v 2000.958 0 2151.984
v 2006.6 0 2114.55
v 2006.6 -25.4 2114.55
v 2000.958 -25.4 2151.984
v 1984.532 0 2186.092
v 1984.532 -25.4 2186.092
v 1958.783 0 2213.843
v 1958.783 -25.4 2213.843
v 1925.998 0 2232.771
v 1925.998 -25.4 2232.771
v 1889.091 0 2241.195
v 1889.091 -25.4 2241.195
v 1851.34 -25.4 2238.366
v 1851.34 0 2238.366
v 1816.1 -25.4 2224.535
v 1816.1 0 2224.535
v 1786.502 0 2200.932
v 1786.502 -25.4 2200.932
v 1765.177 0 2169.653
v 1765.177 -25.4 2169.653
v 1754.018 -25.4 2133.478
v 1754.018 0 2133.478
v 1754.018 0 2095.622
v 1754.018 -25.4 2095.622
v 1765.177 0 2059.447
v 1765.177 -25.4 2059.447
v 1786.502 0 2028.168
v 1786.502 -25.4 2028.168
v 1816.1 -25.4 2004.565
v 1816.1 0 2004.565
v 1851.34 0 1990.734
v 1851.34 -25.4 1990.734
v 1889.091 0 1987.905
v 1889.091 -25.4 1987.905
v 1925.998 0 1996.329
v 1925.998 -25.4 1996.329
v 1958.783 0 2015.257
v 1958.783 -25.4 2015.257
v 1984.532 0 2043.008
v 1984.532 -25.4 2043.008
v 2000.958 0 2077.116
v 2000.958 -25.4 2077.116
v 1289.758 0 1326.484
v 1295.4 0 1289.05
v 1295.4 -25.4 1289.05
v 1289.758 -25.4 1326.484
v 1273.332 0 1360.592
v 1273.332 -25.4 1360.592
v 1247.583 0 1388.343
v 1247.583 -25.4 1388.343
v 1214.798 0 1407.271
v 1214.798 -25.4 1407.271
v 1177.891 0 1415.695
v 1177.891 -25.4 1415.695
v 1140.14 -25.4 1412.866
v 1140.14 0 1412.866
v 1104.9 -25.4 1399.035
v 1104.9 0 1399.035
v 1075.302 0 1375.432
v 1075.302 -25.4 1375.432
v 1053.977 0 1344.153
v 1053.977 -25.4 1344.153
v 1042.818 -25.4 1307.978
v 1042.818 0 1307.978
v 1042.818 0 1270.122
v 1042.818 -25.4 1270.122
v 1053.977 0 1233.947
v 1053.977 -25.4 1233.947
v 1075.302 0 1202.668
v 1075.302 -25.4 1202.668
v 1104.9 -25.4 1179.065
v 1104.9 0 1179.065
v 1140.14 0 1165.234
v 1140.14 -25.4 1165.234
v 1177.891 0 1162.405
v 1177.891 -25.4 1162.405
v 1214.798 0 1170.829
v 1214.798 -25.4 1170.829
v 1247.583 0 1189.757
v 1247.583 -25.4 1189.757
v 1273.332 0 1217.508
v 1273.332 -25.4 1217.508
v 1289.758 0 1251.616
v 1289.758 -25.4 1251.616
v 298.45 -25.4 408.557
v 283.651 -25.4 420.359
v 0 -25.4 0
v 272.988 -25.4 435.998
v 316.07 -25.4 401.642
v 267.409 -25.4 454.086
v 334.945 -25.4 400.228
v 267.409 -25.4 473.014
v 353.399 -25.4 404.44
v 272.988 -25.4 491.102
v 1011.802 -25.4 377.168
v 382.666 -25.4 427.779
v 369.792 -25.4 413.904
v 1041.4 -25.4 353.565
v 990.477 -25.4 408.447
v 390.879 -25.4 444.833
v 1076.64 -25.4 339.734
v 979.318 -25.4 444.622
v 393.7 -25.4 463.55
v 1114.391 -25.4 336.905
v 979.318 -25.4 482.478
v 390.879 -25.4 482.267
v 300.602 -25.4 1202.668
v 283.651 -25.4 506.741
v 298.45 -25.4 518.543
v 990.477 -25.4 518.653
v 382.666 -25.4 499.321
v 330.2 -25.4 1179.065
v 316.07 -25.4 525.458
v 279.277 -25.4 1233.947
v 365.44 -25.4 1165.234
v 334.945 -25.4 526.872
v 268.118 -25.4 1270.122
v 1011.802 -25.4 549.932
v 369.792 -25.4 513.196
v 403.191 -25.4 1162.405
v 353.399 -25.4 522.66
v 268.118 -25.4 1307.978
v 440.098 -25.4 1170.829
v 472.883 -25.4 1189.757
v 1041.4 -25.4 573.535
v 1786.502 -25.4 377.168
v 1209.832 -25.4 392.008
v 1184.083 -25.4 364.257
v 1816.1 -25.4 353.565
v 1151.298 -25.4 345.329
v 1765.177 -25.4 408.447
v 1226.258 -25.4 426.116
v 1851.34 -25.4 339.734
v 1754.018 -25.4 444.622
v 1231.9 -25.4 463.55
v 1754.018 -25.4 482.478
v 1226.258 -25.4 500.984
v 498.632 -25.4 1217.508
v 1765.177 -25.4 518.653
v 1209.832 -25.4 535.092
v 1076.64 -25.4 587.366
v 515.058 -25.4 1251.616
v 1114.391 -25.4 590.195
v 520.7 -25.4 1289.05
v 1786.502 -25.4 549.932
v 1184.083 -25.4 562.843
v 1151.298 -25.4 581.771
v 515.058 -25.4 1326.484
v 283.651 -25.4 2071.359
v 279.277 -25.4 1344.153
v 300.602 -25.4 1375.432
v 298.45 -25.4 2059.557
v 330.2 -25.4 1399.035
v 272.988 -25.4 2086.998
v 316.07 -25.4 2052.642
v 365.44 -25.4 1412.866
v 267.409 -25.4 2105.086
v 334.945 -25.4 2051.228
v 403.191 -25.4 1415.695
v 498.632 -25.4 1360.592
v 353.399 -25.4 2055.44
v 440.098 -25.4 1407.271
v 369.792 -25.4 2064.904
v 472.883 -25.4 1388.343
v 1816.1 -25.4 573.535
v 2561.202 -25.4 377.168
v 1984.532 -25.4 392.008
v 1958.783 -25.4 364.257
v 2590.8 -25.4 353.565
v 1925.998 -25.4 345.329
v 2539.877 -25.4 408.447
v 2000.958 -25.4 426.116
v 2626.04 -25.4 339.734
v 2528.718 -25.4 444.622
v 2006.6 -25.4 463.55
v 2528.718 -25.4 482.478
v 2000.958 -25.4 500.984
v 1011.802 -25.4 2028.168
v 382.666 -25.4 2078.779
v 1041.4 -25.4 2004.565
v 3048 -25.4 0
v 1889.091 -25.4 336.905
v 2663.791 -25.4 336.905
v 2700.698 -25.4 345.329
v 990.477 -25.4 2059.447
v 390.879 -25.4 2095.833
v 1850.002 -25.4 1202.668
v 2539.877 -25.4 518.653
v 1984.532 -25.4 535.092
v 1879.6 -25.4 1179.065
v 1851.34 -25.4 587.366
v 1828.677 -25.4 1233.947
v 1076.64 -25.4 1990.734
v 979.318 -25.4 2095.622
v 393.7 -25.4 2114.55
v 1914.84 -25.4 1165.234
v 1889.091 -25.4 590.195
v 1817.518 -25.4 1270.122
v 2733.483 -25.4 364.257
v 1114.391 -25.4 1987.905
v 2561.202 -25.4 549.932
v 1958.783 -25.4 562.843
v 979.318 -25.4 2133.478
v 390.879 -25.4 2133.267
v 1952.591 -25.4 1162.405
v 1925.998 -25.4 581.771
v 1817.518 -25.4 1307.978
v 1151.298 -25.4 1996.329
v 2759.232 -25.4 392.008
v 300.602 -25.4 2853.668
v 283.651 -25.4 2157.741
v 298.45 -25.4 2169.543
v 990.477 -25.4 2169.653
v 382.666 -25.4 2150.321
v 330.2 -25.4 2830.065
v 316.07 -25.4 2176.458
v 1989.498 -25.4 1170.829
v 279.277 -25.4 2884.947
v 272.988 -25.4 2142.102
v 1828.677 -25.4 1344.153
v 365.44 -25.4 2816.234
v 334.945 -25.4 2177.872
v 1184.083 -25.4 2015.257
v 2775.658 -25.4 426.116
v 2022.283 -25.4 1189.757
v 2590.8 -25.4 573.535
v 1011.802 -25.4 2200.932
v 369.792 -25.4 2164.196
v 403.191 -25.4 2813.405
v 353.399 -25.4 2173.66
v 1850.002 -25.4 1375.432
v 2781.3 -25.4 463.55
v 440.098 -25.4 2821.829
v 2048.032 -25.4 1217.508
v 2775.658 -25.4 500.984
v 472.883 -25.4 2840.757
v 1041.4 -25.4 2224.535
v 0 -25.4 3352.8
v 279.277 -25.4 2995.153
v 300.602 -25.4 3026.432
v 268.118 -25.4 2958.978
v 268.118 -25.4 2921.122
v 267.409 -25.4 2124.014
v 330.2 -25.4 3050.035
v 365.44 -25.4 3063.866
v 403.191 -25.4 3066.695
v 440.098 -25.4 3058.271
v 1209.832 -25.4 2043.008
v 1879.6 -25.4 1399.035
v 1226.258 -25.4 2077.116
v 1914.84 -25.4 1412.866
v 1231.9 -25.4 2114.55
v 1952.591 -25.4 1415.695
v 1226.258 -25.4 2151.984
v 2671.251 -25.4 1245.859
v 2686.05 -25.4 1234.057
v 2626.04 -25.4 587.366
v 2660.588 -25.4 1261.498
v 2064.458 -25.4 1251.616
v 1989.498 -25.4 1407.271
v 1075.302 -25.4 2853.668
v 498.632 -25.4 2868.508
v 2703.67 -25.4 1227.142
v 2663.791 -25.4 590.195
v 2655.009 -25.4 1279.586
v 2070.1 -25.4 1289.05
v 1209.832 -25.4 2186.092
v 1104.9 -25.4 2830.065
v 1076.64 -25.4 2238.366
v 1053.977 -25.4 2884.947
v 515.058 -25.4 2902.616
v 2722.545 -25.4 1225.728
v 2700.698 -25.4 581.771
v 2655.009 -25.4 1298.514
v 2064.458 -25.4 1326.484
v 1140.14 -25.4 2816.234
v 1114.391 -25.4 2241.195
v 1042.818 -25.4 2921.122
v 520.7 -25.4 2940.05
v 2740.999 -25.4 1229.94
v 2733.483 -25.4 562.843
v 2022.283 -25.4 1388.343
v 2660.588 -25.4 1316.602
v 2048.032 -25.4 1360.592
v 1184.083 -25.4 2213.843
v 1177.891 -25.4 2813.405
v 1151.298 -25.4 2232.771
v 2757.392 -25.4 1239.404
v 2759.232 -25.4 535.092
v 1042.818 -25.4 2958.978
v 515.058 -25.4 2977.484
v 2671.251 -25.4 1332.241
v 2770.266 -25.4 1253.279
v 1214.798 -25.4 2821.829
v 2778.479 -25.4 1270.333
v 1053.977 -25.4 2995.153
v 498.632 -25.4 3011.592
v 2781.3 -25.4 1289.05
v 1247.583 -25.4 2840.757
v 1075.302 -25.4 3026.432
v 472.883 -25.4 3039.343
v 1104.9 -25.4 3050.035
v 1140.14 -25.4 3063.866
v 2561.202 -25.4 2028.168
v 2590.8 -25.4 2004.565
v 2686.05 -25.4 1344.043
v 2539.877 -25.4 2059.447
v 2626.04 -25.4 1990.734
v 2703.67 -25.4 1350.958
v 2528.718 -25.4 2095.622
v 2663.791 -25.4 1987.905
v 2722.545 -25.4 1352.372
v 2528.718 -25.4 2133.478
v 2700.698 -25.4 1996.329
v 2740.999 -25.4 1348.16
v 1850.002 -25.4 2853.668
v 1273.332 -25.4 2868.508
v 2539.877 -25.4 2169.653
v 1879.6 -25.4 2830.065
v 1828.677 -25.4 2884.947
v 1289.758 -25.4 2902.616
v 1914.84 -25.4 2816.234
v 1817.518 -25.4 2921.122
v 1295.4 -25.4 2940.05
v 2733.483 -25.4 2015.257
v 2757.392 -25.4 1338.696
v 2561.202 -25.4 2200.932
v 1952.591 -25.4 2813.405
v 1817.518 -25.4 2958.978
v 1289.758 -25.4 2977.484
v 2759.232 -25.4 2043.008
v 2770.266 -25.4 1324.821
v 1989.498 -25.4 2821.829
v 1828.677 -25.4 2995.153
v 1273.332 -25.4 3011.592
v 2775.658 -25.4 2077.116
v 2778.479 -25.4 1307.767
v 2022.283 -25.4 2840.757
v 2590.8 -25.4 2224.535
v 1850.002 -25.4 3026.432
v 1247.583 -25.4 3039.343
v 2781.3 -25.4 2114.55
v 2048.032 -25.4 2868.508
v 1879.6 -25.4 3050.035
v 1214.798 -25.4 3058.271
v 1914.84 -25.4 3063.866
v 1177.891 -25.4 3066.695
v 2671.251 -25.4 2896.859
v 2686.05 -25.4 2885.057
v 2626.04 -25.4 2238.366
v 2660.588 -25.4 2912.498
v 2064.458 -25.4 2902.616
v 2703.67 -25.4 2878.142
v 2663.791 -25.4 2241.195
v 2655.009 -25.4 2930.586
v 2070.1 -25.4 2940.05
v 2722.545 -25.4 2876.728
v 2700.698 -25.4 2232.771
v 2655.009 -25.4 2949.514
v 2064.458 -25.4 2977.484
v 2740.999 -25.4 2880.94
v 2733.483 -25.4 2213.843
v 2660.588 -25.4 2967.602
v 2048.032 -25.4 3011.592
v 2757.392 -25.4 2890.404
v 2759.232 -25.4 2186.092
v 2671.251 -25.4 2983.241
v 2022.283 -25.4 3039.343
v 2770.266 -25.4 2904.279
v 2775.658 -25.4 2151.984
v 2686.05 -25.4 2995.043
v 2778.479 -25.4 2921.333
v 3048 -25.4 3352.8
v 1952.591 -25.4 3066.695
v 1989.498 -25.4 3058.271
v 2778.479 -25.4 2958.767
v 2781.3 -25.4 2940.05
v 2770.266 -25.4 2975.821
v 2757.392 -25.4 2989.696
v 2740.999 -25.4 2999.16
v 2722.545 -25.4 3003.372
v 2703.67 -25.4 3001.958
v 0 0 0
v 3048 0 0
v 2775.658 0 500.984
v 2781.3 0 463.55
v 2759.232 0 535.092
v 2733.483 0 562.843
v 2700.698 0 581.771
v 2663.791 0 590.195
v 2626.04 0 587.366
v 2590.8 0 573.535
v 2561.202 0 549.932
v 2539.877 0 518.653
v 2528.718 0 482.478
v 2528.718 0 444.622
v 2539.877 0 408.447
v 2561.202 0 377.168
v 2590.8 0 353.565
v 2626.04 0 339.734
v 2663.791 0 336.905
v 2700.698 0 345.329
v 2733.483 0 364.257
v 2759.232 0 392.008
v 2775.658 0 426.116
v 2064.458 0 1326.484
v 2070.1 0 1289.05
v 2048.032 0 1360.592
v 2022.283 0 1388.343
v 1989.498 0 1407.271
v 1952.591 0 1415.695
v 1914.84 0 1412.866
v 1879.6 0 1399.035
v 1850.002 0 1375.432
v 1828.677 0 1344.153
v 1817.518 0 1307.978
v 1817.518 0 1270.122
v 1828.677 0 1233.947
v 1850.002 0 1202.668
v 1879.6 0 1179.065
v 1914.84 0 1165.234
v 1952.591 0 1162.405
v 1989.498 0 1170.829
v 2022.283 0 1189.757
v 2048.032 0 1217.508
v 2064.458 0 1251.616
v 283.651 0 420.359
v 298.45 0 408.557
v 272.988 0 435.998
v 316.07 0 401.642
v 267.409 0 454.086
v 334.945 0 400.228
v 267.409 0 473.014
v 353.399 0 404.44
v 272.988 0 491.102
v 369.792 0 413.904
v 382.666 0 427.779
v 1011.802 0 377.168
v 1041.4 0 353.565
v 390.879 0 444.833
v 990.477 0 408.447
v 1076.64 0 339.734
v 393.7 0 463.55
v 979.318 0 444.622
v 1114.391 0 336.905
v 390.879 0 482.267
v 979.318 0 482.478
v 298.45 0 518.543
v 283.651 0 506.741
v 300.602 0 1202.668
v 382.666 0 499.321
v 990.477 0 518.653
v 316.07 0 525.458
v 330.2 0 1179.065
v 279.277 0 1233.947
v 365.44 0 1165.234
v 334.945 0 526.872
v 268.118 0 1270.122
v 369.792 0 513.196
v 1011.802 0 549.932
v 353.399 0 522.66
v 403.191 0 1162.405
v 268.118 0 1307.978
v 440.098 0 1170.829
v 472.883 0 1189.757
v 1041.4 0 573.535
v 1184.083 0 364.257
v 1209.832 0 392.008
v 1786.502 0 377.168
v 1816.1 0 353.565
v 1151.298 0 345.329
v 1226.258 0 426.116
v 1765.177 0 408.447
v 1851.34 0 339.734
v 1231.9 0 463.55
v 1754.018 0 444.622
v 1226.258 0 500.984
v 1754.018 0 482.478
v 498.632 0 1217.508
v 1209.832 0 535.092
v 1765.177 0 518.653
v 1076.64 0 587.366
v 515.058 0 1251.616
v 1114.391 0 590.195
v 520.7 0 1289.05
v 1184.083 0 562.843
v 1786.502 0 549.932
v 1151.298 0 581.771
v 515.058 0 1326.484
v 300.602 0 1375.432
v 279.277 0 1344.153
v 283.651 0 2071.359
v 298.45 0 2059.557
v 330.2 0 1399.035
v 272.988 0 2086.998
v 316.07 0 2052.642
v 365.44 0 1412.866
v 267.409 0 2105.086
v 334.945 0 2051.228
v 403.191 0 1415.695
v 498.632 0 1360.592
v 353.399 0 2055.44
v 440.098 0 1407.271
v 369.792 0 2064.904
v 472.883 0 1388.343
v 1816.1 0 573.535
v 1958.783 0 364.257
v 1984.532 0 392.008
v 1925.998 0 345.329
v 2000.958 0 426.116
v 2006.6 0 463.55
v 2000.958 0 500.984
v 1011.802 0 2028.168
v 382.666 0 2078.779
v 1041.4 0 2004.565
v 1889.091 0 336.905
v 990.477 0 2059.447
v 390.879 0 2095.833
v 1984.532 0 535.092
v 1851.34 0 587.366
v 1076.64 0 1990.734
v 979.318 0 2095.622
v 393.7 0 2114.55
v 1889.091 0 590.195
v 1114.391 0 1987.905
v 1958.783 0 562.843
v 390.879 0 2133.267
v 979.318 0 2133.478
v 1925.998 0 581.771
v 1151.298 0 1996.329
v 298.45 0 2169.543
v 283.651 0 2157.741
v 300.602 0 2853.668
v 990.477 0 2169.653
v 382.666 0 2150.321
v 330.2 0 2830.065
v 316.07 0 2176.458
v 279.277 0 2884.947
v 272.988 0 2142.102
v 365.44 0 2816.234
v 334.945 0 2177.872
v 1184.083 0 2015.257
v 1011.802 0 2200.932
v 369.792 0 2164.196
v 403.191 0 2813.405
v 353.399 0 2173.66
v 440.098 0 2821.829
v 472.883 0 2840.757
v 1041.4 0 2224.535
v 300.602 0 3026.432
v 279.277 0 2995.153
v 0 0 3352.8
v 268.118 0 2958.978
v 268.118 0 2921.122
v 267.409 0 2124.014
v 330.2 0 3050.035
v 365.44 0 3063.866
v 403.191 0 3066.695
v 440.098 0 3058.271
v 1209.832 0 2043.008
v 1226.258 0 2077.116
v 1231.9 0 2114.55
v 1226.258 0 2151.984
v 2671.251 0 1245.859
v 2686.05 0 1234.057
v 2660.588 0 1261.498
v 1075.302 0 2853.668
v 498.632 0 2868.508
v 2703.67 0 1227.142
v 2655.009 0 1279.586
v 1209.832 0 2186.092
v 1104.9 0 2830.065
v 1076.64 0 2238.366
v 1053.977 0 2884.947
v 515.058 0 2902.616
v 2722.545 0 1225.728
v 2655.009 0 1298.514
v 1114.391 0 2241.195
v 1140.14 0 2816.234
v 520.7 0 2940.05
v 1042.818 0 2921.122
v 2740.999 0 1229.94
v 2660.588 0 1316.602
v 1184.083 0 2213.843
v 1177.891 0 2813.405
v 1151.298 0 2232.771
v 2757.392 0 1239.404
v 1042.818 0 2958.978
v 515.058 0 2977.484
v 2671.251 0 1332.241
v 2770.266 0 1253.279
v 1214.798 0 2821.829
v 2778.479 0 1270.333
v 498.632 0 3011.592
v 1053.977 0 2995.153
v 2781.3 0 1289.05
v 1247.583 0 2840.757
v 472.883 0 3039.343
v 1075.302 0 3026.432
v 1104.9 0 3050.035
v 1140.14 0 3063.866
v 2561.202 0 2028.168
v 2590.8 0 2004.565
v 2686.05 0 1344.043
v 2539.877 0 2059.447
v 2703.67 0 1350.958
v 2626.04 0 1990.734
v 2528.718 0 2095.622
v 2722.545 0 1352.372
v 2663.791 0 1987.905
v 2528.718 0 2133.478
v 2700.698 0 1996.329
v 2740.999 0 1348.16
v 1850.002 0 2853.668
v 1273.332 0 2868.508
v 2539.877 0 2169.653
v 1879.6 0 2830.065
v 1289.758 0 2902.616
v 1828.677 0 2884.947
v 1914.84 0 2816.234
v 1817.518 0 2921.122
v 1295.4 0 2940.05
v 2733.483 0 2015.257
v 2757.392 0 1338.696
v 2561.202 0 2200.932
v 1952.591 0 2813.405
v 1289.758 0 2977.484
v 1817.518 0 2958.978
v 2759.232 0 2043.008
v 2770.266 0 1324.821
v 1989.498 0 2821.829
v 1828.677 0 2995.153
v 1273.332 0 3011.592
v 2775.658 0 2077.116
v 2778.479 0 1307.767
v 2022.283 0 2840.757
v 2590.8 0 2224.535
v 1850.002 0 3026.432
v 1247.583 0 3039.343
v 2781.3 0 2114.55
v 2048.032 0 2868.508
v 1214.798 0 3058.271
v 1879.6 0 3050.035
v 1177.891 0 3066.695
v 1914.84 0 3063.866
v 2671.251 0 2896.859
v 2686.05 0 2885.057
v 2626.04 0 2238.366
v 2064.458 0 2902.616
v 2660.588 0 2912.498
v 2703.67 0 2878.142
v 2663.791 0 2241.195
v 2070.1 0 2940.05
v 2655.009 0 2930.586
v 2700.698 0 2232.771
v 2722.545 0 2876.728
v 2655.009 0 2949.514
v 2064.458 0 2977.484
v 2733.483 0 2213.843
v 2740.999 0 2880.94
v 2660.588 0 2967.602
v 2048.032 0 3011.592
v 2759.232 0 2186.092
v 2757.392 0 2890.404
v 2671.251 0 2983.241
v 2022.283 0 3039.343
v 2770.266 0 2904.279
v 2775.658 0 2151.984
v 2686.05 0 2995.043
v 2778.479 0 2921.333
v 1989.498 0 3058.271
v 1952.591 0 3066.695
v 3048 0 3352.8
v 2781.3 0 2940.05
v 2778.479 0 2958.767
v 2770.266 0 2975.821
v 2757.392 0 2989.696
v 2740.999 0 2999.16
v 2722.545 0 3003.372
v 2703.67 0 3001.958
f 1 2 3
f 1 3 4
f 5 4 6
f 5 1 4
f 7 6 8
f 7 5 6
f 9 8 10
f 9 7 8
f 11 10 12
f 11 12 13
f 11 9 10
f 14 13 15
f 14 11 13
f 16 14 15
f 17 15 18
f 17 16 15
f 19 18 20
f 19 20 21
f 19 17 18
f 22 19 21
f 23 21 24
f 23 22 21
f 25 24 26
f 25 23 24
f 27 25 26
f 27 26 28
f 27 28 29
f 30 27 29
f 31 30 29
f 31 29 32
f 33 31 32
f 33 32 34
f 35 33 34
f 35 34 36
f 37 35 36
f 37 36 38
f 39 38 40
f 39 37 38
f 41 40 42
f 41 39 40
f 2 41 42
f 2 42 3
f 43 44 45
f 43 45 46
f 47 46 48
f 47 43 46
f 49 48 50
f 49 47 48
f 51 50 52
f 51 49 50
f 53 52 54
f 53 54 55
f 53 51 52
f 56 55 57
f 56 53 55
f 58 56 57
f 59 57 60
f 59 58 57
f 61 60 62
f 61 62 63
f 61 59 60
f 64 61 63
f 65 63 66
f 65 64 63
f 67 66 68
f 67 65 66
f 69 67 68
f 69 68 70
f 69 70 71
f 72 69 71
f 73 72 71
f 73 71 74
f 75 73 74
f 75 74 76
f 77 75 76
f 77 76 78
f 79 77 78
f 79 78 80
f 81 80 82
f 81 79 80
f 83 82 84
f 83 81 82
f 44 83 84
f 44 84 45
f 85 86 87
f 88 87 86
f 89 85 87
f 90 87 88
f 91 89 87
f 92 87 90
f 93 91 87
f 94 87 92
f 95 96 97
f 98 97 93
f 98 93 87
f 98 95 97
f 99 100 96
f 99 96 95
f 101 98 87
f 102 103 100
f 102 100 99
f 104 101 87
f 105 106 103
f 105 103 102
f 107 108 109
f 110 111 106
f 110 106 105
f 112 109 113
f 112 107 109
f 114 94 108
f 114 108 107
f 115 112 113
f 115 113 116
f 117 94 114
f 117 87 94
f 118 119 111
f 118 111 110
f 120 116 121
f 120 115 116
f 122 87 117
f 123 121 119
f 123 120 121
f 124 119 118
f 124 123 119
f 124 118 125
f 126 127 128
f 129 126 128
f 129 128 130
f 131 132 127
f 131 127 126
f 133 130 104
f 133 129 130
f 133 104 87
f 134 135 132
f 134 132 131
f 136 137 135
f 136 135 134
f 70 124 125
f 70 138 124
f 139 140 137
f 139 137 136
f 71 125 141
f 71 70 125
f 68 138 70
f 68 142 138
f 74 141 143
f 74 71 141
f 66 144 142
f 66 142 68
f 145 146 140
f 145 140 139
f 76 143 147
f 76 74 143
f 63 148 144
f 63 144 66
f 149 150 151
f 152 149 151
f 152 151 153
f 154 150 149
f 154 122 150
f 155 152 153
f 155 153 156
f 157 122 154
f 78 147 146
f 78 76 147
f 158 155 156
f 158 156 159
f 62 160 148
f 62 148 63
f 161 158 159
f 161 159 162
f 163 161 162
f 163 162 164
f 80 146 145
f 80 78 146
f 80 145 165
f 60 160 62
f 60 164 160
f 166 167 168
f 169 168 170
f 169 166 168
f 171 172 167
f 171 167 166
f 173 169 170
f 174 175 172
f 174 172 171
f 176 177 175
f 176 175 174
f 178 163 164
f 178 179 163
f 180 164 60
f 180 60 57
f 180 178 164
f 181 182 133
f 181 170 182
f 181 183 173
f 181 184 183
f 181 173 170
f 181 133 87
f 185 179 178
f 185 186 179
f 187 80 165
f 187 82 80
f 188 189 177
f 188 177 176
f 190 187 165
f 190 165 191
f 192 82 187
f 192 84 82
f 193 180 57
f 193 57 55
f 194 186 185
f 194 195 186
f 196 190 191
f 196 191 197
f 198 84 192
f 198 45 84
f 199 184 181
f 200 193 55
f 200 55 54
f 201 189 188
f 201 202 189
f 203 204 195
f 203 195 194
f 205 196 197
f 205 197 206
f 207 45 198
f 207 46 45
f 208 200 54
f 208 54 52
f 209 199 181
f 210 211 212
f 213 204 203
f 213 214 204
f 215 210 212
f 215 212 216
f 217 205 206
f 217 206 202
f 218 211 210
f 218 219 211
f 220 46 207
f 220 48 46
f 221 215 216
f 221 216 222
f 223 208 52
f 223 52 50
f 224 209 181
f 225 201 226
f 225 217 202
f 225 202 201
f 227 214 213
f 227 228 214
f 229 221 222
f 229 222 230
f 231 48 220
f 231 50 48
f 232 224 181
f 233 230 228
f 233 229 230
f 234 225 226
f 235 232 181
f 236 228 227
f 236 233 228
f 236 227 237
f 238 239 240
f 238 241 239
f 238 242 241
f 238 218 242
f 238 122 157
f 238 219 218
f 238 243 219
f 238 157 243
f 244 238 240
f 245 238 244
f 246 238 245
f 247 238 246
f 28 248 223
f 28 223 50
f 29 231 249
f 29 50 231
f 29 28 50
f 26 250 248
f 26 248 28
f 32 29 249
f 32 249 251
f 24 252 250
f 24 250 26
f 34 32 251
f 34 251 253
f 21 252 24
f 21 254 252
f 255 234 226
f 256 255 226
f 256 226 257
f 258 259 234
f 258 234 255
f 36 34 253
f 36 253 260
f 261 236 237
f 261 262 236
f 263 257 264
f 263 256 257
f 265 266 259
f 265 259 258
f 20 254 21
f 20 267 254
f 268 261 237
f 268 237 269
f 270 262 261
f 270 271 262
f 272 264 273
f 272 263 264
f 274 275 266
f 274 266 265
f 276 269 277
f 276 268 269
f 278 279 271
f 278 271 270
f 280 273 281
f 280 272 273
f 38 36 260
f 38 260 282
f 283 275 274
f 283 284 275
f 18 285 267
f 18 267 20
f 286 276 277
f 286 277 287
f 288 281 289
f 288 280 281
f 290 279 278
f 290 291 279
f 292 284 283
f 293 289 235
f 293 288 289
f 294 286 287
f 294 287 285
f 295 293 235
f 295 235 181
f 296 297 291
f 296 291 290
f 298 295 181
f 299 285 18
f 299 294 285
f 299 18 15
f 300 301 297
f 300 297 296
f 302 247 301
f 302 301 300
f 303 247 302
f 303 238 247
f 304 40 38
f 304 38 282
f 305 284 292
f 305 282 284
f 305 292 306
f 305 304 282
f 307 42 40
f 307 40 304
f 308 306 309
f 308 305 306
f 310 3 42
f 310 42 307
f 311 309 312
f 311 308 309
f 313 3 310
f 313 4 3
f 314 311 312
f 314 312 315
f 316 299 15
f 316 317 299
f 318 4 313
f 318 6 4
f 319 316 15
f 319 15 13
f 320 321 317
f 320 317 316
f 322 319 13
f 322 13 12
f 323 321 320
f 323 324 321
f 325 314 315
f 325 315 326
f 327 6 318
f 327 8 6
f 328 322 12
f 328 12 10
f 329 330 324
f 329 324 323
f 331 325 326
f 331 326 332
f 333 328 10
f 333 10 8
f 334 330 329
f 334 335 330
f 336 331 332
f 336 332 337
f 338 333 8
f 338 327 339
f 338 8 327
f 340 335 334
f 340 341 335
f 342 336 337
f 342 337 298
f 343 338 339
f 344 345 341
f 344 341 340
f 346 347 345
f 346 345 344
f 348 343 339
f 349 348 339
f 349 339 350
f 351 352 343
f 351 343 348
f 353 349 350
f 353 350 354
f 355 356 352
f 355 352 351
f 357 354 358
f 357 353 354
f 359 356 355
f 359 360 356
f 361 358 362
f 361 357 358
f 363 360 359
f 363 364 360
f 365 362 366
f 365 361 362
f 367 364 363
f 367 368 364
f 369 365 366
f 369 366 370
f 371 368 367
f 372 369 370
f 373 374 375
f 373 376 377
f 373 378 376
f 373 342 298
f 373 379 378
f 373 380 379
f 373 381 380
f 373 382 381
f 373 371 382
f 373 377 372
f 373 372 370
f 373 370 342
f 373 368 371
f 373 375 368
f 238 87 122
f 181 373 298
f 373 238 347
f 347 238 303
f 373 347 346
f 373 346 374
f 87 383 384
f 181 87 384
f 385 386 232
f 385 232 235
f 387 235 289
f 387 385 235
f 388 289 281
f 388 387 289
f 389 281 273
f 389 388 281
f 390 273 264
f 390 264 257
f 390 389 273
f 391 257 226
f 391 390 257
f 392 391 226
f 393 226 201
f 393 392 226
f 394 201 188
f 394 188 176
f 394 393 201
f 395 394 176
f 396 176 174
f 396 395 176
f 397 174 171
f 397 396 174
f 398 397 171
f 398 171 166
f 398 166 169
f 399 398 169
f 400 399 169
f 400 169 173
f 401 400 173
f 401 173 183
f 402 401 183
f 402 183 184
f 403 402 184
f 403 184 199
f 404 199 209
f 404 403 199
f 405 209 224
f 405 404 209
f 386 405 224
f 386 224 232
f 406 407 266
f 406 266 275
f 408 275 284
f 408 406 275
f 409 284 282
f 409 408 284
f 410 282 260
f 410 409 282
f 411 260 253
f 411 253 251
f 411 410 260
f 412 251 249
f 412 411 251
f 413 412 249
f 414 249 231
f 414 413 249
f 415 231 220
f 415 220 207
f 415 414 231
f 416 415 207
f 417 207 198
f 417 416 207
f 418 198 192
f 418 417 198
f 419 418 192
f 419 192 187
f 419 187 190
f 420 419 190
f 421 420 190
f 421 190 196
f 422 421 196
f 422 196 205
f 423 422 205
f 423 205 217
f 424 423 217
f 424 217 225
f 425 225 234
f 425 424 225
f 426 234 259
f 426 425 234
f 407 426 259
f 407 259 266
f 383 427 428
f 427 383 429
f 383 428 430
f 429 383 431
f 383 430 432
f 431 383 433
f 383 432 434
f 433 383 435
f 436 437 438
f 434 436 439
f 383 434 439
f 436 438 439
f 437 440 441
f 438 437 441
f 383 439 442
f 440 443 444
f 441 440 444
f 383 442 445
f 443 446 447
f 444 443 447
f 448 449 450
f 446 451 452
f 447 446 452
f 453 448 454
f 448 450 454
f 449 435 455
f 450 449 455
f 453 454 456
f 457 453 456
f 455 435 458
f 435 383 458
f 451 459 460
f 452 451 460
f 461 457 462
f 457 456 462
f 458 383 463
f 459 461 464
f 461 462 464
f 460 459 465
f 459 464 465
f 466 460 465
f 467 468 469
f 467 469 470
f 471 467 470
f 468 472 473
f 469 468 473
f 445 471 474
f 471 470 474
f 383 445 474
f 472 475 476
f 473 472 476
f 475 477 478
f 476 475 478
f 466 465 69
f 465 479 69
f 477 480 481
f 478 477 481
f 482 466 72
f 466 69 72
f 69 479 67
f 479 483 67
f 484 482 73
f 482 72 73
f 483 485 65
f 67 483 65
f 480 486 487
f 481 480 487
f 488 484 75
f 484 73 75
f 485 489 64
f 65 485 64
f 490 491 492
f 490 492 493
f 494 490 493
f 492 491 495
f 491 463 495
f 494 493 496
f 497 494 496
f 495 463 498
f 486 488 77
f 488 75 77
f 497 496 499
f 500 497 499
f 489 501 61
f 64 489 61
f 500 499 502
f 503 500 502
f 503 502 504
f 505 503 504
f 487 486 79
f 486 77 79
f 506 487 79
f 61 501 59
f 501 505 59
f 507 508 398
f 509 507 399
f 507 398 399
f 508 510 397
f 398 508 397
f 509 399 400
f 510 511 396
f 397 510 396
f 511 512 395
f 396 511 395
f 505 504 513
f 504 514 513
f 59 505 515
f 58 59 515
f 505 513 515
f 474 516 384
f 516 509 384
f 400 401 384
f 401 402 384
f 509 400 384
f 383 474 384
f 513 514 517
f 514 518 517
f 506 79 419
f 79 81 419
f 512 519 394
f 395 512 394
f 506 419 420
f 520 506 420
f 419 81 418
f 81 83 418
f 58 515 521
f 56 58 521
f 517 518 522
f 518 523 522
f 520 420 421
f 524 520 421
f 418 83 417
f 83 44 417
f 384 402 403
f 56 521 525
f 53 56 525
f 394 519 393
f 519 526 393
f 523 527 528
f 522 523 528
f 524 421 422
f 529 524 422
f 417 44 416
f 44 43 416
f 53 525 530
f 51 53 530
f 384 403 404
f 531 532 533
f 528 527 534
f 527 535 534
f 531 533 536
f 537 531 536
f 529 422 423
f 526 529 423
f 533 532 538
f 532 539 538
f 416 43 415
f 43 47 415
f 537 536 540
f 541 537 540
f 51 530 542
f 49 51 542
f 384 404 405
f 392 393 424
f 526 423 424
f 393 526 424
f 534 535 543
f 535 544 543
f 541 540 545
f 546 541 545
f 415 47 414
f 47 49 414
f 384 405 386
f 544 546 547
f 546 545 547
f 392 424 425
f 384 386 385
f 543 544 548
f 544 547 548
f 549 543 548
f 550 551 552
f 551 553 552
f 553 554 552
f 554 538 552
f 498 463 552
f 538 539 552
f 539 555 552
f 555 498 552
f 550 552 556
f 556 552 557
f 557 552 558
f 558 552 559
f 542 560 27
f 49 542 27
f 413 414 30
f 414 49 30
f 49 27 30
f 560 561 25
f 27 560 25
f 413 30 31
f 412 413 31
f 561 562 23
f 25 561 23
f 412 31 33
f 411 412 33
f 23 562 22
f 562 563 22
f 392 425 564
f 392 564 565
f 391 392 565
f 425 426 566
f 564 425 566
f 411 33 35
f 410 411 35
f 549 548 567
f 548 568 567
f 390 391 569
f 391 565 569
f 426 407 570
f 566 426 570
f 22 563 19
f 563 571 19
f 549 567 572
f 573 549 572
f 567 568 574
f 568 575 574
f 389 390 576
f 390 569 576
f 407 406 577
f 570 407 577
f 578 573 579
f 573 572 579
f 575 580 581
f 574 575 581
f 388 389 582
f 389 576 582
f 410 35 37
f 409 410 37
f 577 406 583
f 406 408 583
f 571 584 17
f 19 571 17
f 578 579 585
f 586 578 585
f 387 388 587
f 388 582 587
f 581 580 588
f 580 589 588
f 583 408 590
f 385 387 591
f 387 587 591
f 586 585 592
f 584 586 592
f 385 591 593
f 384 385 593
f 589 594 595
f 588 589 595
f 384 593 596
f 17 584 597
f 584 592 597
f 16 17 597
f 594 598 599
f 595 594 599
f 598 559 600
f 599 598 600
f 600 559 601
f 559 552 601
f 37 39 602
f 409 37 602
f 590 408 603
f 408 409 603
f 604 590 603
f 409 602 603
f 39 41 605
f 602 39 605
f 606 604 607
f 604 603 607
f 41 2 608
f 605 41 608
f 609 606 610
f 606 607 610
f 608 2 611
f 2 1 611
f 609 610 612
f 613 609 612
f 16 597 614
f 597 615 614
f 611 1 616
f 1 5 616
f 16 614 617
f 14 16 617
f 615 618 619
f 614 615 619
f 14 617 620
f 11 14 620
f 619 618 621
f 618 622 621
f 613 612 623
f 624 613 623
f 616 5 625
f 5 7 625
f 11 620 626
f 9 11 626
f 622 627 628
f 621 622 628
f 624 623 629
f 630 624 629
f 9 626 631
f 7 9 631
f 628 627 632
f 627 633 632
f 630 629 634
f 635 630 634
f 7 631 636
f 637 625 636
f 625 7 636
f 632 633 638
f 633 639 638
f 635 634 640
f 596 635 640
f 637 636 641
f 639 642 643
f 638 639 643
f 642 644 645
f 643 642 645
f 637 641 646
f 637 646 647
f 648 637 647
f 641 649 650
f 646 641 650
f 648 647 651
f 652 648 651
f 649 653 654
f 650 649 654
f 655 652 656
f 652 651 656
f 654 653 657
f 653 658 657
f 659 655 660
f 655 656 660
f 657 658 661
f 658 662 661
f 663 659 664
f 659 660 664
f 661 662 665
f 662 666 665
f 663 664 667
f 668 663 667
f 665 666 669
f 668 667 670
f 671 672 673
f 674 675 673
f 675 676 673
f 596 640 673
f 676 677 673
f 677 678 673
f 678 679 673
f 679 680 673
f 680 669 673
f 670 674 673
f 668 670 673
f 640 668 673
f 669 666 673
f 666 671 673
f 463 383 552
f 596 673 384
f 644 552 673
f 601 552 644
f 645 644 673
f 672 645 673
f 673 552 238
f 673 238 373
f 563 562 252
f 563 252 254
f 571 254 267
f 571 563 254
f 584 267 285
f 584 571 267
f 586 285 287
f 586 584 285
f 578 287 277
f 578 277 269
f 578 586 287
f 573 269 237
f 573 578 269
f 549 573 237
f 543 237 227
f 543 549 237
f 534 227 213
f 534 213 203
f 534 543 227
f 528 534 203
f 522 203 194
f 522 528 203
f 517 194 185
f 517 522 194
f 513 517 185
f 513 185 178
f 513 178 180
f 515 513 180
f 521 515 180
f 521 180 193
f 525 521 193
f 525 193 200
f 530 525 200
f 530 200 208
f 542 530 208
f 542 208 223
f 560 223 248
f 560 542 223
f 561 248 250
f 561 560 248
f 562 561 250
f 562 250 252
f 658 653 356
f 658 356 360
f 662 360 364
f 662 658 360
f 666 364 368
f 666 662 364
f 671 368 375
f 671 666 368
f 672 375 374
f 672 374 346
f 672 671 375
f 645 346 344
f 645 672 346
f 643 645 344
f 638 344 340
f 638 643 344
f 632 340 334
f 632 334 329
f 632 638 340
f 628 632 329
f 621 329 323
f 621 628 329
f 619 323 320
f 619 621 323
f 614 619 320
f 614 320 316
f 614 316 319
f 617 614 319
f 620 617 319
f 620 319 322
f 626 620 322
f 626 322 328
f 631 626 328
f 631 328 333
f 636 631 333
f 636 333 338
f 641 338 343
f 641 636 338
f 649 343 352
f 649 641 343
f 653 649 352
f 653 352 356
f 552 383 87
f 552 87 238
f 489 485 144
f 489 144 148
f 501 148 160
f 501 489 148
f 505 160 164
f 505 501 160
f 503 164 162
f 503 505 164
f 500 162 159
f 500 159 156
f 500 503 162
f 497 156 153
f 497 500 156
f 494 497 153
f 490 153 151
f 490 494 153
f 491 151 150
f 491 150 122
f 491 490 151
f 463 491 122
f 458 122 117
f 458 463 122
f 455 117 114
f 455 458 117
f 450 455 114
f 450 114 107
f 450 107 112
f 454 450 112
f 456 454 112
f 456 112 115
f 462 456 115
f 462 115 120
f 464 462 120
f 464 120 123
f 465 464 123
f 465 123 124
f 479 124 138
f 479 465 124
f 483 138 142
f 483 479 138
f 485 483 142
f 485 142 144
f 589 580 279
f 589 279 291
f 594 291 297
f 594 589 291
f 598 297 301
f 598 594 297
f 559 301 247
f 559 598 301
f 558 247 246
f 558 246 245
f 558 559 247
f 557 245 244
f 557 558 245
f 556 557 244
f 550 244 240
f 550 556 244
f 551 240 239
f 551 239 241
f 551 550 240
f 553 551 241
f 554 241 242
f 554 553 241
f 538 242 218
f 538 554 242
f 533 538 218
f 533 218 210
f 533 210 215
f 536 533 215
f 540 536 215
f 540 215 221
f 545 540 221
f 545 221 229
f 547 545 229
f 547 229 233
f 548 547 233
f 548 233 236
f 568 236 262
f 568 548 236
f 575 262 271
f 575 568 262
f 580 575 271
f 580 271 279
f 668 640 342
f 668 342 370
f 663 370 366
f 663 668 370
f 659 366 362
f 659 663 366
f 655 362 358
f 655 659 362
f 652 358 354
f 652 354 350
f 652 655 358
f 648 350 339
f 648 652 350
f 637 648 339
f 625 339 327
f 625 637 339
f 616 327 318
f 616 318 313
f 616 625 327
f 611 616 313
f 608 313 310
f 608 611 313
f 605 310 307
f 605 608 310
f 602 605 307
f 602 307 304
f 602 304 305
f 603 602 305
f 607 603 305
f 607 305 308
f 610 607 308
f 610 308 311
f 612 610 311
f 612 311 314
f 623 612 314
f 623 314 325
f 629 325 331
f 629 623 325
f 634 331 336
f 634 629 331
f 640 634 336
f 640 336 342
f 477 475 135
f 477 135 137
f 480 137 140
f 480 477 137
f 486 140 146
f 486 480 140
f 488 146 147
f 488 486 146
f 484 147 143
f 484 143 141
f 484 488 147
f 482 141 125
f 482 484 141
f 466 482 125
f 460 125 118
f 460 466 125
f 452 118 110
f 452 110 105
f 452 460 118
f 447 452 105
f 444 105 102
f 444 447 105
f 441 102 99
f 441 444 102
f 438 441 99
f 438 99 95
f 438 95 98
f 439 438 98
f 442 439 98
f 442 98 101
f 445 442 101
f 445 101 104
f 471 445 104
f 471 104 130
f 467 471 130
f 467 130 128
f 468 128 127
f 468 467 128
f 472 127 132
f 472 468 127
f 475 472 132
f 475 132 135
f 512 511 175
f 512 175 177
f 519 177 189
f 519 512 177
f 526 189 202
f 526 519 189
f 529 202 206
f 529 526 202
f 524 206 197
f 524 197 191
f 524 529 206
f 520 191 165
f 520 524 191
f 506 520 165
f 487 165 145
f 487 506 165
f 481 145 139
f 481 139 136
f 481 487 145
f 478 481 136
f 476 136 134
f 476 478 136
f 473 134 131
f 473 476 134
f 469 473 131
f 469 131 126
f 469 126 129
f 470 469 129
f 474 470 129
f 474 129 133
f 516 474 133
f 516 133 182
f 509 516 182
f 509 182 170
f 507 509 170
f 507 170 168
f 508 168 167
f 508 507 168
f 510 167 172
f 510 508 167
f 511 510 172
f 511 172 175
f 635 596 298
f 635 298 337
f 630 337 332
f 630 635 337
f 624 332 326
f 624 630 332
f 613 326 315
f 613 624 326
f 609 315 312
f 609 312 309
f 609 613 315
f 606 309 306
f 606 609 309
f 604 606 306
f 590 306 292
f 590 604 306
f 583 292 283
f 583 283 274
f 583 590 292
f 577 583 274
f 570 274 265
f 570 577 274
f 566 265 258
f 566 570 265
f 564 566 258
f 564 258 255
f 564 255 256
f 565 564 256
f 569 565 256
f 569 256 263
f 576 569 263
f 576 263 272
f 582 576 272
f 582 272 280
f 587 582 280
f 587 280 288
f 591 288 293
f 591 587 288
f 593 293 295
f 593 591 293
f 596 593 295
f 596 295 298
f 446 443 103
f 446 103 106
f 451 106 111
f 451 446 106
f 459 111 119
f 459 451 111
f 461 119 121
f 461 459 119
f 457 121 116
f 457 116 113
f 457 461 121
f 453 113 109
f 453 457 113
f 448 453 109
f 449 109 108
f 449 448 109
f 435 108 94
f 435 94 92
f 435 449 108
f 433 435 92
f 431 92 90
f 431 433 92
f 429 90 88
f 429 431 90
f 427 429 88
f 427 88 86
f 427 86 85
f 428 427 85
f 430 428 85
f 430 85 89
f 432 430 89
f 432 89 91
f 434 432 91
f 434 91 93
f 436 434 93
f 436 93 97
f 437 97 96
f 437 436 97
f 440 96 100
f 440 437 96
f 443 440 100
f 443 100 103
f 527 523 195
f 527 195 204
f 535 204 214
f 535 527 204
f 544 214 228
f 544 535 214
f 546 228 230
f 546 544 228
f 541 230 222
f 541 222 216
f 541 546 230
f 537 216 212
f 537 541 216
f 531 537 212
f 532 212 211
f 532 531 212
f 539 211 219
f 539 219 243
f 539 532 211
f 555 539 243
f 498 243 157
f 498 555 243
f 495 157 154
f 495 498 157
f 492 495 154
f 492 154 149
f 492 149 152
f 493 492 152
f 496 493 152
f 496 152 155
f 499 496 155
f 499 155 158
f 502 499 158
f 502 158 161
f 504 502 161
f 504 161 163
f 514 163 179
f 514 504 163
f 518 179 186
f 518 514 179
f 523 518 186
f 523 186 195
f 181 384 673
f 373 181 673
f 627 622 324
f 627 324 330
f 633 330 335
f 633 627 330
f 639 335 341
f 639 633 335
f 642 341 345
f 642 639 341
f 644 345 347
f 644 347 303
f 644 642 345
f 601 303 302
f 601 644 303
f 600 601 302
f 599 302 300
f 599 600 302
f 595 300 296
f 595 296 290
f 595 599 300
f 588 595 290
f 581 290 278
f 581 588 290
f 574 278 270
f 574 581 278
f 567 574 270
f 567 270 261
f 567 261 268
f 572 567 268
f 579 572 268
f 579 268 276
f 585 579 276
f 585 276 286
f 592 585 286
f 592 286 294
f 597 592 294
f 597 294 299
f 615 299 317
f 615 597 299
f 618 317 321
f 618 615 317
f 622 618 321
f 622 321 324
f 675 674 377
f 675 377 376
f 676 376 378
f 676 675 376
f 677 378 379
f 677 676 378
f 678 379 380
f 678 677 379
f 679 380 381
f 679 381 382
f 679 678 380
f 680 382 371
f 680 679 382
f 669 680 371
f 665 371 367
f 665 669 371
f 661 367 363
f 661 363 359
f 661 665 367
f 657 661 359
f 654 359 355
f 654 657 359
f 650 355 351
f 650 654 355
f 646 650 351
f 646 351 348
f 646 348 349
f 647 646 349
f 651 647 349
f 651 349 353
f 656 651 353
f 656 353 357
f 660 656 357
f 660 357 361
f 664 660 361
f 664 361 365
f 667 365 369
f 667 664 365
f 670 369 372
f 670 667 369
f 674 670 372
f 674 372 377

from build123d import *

# Parameters (mm, degrees)
F0_W     = 3048
F0_H     = 3352.8
F0_R     = 63.5
F0_R_2   = 127
F1_DEPTH = 25.4


with BuildPart() as f1:
    # F0 (on Front) → F1 (new body)
    with BuildSketch(Plane.XZ):
        with Locations((1524, 1676.4)):
            Rectangle(F0_W, F0_H)
        with Locations((330.2, 463.55)):
            Circle(F0_R, mode=Mode.SUBTRACT)
        with Locations((1104.9, 463.55)):
            Circle(F0_R_2, mode=Mode.SUBTRACT)
        with Locations((393.7, 1289.05)):
            Circle(F0_R_2, mode=Mode.SUBTRACT)
        with Locations((1168.4, 1289.05)):
            Circle(F0_R_2, mode=Mode.SUBTRACT)
        with Locations((1879.6, 463.55)):
            Circle(F0_R_2, mode=Mode.SUBTRACT)
        with Locations((2654.3, 463.55)):
            Circle(F0_R_2, mode=Mode.SUBTRACT)
        with Locations((1943.1, 1289.05)):
            Circle(F0_R_2, mode=Mode.SUBTRACT)
        with Locations((2717.8, 1289.05)):
            Circle(F0_R, mode=Mode.SUBTRACT)
        with Locations((330.2, 2114.55)):
            Circle(F0_R, mode=Mode.SUBTRACT)
        with Locations((1104.9, 2114.55)):
            Circle(F0_R_2, mode=Mode.SUBTRACT)
        with Locations((393.7, 2940.05)):
            Circle(F0_R_2, mode=Mode.SUBTRACT)
        with Locations((1168.4, 2940.05)):
            Circle(F0_R_2, mode=Mode.SUBTRACT)
        with Locations((1879.6, 2114.55)):
            Circle(F0_R_2, mode=Mode.SUBTRACT)
        with Locations((2654.3, 2114.55)):
            Circle(F0_R_2, mode=Mode.SUBTRACT)
        with Locations((1943.1, 2940.05)):
            Circle(F0_R_2, mode=Mode.SUBTRACT)
        with Locations((2717.8, 2940.05)):
            Circle(F0_R, mode=Mode.SUBTRACT)
    extrude(amount=F1_DEPTH)


solid = f1.part
